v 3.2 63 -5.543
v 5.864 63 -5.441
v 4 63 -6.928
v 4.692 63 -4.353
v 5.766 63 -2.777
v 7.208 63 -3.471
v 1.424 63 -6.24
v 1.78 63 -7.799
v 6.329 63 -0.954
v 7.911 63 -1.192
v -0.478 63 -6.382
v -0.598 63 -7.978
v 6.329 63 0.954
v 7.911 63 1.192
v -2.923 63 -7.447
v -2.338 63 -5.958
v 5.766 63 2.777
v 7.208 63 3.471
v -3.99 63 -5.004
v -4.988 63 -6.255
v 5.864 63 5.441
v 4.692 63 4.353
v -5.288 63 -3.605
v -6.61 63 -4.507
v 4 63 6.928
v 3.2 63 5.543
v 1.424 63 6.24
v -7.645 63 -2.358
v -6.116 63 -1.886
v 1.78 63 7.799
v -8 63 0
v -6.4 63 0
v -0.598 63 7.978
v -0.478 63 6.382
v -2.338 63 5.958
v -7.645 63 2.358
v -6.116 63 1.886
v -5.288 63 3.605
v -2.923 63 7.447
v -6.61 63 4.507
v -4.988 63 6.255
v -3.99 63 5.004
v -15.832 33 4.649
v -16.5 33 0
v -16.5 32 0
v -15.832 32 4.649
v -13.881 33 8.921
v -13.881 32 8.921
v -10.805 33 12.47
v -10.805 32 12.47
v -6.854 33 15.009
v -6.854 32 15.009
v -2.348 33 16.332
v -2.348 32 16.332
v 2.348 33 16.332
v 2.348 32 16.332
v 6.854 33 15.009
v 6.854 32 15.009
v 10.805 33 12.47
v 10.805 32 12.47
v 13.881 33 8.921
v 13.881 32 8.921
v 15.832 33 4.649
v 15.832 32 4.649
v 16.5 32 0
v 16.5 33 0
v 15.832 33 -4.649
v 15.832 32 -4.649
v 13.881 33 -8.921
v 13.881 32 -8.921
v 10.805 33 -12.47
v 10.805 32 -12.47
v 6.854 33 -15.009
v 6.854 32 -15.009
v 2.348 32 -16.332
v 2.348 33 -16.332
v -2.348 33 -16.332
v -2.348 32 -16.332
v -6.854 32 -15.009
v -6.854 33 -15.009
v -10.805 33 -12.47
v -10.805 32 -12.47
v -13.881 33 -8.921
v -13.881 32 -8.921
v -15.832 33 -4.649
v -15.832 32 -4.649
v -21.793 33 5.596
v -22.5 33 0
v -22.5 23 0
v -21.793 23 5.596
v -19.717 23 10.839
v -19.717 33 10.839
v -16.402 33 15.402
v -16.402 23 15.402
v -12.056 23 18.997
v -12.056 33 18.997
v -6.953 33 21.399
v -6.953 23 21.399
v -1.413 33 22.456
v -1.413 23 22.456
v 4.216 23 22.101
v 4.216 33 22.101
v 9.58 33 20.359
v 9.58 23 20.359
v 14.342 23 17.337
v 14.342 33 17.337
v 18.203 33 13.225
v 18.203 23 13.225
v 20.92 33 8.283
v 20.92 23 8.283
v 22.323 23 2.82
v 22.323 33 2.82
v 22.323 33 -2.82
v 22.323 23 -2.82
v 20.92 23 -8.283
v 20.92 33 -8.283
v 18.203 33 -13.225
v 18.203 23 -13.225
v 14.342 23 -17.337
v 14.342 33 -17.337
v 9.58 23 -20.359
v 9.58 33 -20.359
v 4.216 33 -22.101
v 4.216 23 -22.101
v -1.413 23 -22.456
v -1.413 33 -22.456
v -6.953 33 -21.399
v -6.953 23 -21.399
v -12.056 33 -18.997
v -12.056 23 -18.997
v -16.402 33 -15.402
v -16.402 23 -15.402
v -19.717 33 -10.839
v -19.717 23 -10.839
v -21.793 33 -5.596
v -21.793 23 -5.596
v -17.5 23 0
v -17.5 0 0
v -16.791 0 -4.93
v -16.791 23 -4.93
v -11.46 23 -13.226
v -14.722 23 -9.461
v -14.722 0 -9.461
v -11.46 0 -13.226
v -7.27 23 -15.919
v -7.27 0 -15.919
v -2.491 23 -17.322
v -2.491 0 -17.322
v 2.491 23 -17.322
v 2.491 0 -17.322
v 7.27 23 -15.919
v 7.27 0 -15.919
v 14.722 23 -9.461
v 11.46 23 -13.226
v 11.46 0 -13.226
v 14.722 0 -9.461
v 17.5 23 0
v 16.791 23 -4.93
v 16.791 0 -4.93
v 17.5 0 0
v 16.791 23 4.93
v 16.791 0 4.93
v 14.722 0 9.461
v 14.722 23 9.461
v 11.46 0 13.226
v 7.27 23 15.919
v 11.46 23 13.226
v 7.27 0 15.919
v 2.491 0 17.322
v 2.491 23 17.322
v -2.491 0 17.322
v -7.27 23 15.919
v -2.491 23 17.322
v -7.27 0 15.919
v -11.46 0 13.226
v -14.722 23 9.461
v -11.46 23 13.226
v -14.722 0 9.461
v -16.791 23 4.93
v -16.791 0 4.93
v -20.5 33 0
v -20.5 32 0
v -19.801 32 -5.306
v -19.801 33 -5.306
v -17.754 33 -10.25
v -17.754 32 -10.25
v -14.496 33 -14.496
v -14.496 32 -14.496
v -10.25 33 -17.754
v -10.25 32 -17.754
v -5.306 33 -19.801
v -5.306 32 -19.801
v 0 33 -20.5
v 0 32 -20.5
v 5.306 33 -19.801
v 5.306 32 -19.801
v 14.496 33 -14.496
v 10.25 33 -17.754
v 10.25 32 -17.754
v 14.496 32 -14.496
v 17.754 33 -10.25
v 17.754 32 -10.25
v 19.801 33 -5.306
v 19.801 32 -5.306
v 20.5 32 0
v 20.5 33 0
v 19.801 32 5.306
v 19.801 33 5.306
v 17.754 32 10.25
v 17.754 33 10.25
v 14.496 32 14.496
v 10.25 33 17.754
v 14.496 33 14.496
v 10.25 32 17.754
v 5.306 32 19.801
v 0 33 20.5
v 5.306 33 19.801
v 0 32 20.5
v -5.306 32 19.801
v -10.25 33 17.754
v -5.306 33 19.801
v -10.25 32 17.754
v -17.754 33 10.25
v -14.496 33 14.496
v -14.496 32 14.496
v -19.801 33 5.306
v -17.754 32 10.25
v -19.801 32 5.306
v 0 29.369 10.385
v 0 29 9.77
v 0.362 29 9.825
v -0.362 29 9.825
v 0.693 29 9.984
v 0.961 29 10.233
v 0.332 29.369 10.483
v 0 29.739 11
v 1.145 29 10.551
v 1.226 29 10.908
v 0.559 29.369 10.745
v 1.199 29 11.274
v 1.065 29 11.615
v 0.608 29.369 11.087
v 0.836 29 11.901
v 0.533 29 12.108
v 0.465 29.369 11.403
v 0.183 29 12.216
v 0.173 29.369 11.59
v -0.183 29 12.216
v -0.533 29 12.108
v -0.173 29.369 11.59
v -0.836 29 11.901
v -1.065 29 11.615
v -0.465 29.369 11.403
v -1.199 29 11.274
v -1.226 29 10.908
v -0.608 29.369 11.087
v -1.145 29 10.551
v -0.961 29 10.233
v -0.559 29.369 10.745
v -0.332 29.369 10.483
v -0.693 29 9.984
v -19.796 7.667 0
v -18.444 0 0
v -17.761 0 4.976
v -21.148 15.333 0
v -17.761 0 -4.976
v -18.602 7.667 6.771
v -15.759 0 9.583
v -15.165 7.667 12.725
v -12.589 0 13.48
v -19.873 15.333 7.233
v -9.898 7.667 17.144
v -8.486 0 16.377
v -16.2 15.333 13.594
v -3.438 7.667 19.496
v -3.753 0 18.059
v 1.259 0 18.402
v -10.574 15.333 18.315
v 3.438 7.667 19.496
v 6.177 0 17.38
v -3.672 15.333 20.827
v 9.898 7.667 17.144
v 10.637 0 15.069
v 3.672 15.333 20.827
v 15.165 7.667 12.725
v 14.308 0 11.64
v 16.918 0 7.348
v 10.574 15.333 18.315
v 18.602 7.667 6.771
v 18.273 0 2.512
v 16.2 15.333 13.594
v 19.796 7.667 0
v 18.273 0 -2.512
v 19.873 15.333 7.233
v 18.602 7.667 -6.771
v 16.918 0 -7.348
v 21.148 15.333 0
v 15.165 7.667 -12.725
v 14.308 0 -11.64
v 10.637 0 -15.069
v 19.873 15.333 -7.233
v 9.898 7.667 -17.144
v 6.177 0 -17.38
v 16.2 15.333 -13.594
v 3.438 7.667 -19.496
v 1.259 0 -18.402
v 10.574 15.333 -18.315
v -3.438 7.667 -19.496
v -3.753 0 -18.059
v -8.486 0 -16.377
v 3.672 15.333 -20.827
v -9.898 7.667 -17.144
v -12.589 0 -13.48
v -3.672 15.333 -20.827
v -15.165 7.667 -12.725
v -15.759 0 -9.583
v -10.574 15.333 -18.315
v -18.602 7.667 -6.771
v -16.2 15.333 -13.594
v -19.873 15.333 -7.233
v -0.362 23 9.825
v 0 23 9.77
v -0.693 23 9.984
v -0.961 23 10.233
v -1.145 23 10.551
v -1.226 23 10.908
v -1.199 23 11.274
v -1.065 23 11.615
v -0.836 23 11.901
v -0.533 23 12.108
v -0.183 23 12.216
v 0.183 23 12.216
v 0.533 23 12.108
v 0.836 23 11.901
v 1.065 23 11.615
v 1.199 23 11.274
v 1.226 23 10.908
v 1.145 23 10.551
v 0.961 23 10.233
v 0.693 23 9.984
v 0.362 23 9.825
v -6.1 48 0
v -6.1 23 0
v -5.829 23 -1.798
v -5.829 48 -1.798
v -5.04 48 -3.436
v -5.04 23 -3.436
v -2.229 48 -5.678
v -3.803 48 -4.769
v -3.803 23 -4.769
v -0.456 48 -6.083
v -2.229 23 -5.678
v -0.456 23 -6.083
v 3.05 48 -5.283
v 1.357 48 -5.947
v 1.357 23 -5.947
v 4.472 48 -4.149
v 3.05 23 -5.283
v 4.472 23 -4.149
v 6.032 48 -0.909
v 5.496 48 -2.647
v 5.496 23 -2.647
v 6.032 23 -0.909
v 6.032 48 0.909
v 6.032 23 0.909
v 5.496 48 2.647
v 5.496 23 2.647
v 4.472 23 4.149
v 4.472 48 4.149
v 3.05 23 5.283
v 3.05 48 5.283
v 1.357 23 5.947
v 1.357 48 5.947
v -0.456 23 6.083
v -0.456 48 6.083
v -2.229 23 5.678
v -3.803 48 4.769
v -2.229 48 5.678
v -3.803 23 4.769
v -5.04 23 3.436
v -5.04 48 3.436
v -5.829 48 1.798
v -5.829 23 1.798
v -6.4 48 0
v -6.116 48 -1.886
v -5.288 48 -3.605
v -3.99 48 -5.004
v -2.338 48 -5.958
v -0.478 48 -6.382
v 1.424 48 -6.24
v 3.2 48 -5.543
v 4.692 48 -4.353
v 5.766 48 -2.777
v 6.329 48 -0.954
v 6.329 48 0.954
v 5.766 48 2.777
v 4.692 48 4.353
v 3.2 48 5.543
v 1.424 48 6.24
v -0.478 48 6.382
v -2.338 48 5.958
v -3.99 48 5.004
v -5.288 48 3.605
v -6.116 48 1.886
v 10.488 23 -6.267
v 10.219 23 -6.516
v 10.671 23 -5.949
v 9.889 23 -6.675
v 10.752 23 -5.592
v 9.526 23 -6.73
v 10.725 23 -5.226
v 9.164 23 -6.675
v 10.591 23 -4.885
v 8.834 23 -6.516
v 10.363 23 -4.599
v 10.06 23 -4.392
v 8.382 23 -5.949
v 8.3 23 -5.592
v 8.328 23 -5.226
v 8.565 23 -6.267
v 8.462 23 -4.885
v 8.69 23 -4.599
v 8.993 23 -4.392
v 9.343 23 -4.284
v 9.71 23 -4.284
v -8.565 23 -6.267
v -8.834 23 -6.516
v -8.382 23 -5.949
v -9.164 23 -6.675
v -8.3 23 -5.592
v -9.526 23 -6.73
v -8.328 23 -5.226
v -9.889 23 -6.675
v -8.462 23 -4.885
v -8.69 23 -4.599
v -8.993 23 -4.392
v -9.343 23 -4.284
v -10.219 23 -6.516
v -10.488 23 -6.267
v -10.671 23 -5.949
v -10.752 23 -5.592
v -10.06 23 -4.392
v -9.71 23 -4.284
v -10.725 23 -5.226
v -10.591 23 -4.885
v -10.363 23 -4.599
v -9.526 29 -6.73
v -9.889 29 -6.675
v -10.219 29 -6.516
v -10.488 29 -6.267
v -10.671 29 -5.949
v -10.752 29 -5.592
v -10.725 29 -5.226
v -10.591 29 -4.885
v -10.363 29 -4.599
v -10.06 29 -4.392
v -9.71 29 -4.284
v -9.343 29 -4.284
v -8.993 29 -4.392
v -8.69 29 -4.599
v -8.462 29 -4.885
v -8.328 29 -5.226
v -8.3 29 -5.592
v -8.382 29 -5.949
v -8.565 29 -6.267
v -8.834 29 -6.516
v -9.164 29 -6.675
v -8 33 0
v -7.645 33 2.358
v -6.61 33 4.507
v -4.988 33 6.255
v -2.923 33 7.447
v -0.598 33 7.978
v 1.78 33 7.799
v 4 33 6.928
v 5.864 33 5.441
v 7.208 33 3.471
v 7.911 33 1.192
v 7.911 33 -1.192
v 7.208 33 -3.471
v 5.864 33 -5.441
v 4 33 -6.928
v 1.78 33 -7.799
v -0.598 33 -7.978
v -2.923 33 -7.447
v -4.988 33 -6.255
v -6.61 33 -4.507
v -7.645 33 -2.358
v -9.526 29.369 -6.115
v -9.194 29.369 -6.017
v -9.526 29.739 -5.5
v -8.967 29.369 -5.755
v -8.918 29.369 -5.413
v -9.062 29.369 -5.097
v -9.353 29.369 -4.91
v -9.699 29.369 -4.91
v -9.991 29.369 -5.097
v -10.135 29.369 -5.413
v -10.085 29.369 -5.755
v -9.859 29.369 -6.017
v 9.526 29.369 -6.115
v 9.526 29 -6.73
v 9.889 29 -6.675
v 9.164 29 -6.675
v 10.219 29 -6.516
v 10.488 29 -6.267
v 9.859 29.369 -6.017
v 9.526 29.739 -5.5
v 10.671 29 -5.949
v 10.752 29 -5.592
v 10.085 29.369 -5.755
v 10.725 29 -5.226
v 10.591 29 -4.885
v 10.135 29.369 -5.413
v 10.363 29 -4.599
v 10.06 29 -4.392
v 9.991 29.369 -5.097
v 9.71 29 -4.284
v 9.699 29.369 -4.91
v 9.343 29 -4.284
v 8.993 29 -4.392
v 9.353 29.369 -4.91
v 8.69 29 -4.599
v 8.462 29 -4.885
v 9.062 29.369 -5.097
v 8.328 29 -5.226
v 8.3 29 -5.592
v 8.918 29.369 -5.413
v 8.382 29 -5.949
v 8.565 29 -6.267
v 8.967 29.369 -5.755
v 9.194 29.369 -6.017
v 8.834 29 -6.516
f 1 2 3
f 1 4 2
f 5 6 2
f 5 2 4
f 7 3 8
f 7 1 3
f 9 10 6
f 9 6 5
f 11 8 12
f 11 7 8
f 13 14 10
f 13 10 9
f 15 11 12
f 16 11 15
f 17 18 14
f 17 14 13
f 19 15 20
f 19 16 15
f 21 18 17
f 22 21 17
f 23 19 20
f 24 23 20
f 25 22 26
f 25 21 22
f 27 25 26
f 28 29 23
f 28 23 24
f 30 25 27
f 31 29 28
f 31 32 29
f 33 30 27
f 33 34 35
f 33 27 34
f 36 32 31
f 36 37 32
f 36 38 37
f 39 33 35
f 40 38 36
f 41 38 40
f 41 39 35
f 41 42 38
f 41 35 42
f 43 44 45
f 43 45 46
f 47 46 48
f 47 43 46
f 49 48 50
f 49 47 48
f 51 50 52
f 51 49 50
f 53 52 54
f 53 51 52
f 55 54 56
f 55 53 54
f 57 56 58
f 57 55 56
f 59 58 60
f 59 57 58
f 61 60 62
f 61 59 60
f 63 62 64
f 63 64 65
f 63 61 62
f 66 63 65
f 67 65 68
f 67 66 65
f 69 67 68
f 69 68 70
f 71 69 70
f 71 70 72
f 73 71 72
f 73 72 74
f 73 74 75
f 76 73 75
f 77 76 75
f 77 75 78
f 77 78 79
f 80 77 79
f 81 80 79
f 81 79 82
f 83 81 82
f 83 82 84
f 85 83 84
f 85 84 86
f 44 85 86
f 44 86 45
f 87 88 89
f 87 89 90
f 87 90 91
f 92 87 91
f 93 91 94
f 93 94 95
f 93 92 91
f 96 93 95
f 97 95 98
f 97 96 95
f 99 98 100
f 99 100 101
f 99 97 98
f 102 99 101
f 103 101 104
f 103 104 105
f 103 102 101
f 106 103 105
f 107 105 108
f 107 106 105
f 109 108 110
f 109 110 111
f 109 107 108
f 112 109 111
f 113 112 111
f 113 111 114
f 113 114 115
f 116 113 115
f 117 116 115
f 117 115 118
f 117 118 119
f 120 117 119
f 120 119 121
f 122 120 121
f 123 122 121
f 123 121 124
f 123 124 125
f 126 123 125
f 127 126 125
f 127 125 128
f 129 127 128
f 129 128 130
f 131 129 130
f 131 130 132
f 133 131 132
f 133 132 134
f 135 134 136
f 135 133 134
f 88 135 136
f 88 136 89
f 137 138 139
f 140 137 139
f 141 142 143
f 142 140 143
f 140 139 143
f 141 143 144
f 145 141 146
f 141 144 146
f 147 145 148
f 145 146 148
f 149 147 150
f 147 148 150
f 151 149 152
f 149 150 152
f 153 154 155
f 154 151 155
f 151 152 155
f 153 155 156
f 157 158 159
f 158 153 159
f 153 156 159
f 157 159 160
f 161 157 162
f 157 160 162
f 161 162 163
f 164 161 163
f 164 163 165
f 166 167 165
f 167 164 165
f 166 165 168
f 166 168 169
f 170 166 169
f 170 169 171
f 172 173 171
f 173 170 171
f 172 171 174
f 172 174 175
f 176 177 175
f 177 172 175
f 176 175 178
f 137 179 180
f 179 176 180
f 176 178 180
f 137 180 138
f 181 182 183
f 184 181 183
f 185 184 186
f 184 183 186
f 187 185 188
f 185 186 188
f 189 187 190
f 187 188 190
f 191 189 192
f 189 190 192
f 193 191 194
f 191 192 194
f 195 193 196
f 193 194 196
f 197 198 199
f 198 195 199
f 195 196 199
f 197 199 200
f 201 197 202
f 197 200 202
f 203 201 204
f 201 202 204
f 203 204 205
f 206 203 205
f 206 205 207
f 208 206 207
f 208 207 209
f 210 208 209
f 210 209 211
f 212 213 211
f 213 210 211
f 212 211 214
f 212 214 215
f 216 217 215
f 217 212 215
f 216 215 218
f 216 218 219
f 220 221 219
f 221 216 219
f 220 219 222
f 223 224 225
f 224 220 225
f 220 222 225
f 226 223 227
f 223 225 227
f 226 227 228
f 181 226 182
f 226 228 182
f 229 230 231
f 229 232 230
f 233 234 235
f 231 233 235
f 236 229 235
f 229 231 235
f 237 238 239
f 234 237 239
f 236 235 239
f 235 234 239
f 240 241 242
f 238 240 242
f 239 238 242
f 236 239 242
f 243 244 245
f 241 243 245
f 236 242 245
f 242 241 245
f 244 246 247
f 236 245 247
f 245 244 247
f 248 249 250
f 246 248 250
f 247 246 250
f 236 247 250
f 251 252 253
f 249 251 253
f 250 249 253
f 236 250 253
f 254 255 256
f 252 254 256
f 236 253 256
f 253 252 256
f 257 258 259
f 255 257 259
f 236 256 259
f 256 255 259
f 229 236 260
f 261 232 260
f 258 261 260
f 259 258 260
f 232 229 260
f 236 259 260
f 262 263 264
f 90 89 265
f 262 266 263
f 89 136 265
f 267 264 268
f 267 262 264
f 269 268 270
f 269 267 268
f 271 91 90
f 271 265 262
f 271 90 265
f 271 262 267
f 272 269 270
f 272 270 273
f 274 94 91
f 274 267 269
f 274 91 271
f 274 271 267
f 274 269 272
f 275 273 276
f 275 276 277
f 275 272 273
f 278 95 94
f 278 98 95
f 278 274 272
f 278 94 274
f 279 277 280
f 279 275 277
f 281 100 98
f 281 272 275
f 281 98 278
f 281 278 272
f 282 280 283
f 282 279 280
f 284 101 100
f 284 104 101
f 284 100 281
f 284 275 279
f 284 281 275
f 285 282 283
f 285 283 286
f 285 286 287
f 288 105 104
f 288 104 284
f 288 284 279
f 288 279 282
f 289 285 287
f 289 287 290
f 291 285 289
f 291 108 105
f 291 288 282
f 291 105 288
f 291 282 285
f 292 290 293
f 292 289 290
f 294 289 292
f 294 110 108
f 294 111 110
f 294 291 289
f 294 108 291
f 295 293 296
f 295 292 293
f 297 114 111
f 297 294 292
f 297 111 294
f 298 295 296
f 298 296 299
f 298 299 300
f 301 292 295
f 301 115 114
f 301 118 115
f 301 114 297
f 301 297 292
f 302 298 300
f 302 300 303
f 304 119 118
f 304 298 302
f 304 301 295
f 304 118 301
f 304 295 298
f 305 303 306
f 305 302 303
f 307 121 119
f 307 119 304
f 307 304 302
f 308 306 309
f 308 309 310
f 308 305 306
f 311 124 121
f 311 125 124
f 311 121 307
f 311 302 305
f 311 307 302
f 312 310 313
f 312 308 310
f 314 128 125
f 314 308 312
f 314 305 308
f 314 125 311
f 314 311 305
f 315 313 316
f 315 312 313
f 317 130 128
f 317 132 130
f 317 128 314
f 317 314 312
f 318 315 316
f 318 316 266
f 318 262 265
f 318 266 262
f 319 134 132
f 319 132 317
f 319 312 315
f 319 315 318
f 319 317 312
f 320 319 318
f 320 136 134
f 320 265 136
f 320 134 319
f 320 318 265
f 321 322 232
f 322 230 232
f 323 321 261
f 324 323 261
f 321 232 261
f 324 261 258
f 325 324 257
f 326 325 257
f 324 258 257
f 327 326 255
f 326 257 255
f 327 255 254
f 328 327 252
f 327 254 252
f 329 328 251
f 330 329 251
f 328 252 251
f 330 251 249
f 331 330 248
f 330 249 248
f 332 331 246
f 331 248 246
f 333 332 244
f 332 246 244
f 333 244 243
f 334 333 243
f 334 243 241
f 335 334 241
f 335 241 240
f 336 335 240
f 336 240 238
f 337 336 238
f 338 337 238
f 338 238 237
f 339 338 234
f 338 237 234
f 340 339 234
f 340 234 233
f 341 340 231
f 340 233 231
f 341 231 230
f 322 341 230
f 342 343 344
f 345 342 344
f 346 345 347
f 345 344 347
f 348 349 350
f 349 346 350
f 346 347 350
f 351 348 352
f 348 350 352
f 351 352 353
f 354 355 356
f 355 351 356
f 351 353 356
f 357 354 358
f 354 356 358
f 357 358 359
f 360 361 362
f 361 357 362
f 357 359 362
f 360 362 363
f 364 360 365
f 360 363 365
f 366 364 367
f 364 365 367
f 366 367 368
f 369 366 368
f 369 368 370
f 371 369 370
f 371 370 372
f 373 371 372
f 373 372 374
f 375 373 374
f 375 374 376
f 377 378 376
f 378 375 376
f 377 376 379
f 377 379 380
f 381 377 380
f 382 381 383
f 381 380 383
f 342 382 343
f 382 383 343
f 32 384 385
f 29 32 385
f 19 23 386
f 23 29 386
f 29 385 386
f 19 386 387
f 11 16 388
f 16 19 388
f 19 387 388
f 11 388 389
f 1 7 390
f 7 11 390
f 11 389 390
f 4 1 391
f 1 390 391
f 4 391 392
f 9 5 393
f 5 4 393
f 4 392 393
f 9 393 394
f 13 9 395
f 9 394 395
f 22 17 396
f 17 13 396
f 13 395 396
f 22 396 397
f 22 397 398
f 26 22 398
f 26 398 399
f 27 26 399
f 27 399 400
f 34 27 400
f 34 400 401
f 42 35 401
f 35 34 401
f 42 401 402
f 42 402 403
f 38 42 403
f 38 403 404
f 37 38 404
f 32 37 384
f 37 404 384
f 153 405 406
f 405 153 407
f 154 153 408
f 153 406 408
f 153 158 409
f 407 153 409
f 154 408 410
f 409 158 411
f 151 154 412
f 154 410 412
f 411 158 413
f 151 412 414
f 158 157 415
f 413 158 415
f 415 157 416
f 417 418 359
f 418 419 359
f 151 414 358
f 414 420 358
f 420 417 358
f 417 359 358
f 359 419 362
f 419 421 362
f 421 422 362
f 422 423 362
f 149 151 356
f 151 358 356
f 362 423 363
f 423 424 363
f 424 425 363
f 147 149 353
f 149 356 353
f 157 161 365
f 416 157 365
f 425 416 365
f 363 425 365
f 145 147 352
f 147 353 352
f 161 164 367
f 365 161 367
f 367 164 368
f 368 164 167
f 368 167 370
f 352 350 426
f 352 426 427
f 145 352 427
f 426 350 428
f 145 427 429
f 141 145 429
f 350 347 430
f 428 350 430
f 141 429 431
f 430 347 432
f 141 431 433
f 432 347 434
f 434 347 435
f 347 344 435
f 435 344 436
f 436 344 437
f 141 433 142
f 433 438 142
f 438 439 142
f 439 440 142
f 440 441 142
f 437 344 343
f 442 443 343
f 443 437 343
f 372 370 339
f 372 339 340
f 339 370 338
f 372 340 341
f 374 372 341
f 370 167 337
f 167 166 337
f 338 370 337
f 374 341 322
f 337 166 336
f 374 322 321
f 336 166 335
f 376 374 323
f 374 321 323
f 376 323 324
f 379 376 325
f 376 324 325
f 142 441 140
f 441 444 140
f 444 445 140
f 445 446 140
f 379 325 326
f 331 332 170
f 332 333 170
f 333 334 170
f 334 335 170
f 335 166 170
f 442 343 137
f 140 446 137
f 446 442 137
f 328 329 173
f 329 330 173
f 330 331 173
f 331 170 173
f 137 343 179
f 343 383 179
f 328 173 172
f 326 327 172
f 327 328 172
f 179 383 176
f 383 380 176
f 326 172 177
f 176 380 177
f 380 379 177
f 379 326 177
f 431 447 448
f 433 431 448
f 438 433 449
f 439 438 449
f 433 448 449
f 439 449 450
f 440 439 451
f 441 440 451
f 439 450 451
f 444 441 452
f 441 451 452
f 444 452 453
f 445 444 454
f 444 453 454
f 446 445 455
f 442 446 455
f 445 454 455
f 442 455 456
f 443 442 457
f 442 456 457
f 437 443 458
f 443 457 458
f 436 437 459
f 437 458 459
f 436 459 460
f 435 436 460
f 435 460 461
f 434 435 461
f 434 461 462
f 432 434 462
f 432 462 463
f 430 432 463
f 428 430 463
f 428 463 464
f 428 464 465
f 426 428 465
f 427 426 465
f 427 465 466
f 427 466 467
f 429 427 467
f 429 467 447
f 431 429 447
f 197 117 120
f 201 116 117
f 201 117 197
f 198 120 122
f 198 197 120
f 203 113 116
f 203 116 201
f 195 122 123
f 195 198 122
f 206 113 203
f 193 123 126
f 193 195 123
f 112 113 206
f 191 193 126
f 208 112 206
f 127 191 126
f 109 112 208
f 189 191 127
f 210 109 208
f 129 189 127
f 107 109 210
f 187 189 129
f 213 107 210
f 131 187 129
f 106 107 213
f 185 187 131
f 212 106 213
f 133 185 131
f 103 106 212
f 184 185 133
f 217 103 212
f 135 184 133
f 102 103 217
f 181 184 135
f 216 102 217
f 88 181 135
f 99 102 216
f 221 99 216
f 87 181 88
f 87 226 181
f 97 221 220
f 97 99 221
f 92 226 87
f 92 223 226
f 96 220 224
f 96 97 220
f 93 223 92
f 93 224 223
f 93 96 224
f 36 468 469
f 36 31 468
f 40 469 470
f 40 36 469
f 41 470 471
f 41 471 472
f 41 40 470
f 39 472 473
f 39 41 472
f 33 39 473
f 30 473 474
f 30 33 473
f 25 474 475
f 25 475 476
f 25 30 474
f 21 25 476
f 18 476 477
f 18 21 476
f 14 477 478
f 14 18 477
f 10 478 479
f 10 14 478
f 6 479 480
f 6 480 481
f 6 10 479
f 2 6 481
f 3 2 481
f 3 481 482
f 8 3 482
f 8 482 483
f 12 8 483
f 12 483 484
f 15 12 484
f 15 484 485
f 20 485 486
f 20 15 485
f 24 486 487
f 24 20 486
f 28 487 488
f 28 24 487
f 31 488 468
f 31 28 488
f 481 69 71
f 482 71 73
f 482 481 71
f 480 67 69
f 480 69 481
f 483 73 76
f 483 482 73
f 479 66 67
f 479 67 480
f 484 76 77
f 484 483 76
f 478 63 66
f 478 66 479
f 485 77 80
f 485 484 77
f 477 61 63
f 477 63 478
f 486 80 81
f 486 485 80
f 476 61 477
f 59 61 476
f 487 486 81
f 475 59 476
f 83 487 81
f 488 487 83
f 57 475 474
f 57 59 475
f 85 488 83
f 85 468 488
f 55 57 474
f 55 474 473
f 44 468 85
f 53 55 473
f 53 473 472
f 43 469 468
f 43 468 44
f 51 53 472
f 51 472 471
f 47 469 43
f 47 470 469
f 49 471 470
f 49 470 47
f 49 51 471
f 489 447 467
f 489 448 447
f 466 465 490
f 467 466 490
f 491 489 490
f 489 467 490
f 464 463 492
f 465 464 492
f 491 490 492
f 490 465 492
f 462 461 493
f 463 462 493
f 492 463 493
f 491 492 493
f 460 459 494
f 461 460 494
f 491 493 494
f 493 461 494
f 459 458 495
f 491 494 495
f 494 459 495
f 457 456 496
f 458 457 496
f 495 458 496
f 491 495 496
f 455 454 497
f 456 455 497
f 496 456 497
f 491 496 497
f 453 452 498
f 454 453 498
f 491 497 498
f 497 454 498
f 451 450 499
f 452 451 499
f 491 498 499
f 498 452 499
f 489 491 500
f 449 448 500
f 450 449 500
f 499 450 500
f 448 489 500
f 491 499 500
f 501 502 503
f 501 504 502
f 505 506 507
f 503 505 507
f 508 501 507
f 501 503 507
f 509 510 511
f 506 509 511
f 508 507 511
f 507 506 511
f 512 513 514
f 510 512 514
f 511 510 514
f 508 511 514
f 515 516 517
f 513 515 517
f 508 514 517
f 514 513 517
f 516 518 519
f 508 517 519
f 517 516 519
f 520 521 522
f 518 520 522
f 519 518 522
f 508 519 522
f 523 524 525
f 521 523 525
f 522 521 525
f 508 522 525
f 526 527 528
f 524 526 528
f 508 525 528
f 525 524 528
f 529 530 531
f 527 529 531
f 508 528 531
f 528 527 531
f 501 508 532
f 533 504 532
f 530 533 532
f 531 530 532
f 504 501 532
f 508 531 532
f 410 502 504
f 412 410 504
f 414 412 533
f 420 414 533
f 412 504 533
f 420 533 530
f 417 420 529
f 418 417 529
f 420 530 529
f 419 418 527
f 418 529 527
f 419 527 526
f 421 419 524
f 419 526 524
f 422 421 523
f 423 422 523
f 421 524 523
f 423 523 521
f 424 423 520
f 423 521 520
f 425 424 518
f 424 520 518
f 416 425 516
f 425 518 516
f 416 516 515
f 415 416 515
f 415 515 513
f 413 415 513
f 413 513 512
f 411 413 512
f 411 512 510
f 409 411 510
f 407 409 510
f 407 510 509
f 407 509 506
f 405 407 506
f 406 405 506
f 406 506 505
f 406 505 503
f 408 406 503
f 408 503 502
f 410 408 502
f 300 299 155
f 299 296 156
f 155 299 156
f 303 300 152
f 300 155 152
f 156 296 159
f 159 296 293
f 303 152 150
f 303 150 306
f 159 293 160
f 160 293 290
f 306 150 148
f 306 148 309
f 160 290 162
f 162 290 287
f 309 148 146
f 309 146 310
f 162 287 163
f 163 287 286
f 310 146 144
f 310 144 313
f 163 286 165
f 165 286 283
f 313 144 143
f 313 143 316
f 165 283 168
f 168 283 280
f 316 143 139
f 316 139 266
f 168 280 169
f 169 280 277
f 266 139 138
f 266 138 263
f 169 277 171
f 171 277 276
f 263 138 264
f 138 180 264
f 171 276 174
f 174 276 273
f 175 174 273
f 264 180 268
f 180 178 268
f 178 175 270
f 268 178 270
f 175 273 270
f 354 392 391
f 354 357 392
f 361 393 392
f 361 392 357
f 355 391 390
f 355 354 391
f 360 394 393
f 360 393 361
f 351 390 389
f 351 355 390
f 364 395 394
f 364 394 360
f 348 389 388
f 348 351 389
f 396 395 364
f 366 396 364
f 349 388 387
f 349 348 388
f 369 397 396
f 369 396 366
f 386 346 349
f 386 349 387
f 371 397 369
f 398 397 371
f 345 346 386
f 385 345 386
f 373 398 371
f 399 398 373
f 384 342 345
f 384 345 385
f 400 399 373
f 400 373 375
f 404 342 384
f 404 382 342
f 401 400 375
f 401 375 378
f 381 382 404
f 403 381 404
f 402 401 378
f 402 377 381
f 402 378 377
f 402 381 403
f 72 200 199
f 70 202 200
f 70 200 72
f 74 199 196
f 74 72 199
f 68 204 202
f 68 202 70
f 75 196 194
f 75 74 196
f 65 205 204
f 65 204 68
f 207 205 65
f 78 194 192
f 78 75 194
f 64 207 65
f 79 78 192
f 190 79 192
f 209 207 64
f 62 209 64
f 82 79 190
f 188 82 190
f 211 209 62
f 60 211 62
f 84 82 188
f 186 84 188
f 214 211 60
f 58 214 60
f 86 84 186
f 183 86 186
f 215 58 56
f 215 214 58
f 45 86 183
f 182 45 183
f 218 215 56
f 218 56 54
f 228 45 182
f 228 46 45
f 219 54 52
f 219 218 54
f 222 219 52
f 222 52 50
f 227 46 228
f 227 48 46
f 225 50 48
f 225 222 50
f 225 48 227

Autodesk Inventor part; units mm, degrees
ref_plane "YZ Plane" through (0, 0, 0) normal (1, 0, 0) x (0, 1, 0)
ref_plane "XZ Plane" through (0, 0, 0) normal (0, 1, 0) x (-1, 0, 0)
ref_plane "XY Plane" through (0, 0, 0) normal (0, 0, 1) x (1, 0, 0)
sketch "Sketch1" plane through (0, 0, 0) normal (0, 0, 1) x (1, 0, 0)
  line L0 (-6.4, 63) -> (-6.4, 48)
  line L1 (-6.4, 48) -> (-6.1, 48)
  line L2 (-6.1, 48) -> (-6.1, 23)
  line L3 (-6.1, 23) -> (-17.5, 23)
  line L4 (-17.5, 23) -> (-17.5, 0)
  line L5 (-17.5, 0) -> (-18.4445, 0)
  line L6 (-18.4445, 0) -> (-22.5, 23)
  line L7 (-22.5, 23) -> (-22.5, 33)
  line L8 (-22.5, 33) -> (-20.5, 33)
  line L9 (-20.5, 33) -> (-20.5, 32)
  line L10 (-20.5, 32) -> (-16.5, 32)
  line L11 (-16.5, 32) -> (-16.5, 33)
  line L12 (-16.5, 33) -> (-8, 33)
  line L13 (-8, 33) -> (-8, 63)
  line L14 (-8, 63) -> (-6.4, 63)
  line L15 (0, -12.6) -> (0, 75.6) projected
  point P0 (0, 0)
  point P1 (-17.9722, 0)
  dimension "d0" = 23
  dimension "d1" = 15
  dimension "d2" = 30
  dimension "d3" = 10
  dimension "d4" = 17.5
  dimension "d5" = 6.1
  dimension "d6" = 6.4
  dimension "d7" = 8
  dimension "d8" = 22.5
  dimension "d9" = 10
  dimension "d10" = 4
  dimension "d11" = 20.5
  dimension "d12" = 1
revolve "Revolution1" add sketch "Sketch1" angle 360 about axis through (0, -10, 0) along (0, 1, 0)
sketch "Sketch2" plane through (0, 23, 0) normal (0, -1, 0) x (1, 0, 0)
  circle A0 centre (0, 0) radius 11 construction
  point P0 (0, 11)
  point P1 (-9.5263, -5.5)
  point P2 (9.5263, -5.5)
  dimension "d14" = 22
  dimension "d15" = 120
  dimension "d16" = 120
hole "Hole1" at (0, 23, 11) at (-9.5263, 23, -5.5) at (9.5263, 23, -5.5) direction (0, 1, 0) diameter 2.459 depth 6 tip angle 118 thread size "M3x0.5" class "6H" standard "ANSI Metric M Profile"
properties part number "FlangeCone" material "Brass"
